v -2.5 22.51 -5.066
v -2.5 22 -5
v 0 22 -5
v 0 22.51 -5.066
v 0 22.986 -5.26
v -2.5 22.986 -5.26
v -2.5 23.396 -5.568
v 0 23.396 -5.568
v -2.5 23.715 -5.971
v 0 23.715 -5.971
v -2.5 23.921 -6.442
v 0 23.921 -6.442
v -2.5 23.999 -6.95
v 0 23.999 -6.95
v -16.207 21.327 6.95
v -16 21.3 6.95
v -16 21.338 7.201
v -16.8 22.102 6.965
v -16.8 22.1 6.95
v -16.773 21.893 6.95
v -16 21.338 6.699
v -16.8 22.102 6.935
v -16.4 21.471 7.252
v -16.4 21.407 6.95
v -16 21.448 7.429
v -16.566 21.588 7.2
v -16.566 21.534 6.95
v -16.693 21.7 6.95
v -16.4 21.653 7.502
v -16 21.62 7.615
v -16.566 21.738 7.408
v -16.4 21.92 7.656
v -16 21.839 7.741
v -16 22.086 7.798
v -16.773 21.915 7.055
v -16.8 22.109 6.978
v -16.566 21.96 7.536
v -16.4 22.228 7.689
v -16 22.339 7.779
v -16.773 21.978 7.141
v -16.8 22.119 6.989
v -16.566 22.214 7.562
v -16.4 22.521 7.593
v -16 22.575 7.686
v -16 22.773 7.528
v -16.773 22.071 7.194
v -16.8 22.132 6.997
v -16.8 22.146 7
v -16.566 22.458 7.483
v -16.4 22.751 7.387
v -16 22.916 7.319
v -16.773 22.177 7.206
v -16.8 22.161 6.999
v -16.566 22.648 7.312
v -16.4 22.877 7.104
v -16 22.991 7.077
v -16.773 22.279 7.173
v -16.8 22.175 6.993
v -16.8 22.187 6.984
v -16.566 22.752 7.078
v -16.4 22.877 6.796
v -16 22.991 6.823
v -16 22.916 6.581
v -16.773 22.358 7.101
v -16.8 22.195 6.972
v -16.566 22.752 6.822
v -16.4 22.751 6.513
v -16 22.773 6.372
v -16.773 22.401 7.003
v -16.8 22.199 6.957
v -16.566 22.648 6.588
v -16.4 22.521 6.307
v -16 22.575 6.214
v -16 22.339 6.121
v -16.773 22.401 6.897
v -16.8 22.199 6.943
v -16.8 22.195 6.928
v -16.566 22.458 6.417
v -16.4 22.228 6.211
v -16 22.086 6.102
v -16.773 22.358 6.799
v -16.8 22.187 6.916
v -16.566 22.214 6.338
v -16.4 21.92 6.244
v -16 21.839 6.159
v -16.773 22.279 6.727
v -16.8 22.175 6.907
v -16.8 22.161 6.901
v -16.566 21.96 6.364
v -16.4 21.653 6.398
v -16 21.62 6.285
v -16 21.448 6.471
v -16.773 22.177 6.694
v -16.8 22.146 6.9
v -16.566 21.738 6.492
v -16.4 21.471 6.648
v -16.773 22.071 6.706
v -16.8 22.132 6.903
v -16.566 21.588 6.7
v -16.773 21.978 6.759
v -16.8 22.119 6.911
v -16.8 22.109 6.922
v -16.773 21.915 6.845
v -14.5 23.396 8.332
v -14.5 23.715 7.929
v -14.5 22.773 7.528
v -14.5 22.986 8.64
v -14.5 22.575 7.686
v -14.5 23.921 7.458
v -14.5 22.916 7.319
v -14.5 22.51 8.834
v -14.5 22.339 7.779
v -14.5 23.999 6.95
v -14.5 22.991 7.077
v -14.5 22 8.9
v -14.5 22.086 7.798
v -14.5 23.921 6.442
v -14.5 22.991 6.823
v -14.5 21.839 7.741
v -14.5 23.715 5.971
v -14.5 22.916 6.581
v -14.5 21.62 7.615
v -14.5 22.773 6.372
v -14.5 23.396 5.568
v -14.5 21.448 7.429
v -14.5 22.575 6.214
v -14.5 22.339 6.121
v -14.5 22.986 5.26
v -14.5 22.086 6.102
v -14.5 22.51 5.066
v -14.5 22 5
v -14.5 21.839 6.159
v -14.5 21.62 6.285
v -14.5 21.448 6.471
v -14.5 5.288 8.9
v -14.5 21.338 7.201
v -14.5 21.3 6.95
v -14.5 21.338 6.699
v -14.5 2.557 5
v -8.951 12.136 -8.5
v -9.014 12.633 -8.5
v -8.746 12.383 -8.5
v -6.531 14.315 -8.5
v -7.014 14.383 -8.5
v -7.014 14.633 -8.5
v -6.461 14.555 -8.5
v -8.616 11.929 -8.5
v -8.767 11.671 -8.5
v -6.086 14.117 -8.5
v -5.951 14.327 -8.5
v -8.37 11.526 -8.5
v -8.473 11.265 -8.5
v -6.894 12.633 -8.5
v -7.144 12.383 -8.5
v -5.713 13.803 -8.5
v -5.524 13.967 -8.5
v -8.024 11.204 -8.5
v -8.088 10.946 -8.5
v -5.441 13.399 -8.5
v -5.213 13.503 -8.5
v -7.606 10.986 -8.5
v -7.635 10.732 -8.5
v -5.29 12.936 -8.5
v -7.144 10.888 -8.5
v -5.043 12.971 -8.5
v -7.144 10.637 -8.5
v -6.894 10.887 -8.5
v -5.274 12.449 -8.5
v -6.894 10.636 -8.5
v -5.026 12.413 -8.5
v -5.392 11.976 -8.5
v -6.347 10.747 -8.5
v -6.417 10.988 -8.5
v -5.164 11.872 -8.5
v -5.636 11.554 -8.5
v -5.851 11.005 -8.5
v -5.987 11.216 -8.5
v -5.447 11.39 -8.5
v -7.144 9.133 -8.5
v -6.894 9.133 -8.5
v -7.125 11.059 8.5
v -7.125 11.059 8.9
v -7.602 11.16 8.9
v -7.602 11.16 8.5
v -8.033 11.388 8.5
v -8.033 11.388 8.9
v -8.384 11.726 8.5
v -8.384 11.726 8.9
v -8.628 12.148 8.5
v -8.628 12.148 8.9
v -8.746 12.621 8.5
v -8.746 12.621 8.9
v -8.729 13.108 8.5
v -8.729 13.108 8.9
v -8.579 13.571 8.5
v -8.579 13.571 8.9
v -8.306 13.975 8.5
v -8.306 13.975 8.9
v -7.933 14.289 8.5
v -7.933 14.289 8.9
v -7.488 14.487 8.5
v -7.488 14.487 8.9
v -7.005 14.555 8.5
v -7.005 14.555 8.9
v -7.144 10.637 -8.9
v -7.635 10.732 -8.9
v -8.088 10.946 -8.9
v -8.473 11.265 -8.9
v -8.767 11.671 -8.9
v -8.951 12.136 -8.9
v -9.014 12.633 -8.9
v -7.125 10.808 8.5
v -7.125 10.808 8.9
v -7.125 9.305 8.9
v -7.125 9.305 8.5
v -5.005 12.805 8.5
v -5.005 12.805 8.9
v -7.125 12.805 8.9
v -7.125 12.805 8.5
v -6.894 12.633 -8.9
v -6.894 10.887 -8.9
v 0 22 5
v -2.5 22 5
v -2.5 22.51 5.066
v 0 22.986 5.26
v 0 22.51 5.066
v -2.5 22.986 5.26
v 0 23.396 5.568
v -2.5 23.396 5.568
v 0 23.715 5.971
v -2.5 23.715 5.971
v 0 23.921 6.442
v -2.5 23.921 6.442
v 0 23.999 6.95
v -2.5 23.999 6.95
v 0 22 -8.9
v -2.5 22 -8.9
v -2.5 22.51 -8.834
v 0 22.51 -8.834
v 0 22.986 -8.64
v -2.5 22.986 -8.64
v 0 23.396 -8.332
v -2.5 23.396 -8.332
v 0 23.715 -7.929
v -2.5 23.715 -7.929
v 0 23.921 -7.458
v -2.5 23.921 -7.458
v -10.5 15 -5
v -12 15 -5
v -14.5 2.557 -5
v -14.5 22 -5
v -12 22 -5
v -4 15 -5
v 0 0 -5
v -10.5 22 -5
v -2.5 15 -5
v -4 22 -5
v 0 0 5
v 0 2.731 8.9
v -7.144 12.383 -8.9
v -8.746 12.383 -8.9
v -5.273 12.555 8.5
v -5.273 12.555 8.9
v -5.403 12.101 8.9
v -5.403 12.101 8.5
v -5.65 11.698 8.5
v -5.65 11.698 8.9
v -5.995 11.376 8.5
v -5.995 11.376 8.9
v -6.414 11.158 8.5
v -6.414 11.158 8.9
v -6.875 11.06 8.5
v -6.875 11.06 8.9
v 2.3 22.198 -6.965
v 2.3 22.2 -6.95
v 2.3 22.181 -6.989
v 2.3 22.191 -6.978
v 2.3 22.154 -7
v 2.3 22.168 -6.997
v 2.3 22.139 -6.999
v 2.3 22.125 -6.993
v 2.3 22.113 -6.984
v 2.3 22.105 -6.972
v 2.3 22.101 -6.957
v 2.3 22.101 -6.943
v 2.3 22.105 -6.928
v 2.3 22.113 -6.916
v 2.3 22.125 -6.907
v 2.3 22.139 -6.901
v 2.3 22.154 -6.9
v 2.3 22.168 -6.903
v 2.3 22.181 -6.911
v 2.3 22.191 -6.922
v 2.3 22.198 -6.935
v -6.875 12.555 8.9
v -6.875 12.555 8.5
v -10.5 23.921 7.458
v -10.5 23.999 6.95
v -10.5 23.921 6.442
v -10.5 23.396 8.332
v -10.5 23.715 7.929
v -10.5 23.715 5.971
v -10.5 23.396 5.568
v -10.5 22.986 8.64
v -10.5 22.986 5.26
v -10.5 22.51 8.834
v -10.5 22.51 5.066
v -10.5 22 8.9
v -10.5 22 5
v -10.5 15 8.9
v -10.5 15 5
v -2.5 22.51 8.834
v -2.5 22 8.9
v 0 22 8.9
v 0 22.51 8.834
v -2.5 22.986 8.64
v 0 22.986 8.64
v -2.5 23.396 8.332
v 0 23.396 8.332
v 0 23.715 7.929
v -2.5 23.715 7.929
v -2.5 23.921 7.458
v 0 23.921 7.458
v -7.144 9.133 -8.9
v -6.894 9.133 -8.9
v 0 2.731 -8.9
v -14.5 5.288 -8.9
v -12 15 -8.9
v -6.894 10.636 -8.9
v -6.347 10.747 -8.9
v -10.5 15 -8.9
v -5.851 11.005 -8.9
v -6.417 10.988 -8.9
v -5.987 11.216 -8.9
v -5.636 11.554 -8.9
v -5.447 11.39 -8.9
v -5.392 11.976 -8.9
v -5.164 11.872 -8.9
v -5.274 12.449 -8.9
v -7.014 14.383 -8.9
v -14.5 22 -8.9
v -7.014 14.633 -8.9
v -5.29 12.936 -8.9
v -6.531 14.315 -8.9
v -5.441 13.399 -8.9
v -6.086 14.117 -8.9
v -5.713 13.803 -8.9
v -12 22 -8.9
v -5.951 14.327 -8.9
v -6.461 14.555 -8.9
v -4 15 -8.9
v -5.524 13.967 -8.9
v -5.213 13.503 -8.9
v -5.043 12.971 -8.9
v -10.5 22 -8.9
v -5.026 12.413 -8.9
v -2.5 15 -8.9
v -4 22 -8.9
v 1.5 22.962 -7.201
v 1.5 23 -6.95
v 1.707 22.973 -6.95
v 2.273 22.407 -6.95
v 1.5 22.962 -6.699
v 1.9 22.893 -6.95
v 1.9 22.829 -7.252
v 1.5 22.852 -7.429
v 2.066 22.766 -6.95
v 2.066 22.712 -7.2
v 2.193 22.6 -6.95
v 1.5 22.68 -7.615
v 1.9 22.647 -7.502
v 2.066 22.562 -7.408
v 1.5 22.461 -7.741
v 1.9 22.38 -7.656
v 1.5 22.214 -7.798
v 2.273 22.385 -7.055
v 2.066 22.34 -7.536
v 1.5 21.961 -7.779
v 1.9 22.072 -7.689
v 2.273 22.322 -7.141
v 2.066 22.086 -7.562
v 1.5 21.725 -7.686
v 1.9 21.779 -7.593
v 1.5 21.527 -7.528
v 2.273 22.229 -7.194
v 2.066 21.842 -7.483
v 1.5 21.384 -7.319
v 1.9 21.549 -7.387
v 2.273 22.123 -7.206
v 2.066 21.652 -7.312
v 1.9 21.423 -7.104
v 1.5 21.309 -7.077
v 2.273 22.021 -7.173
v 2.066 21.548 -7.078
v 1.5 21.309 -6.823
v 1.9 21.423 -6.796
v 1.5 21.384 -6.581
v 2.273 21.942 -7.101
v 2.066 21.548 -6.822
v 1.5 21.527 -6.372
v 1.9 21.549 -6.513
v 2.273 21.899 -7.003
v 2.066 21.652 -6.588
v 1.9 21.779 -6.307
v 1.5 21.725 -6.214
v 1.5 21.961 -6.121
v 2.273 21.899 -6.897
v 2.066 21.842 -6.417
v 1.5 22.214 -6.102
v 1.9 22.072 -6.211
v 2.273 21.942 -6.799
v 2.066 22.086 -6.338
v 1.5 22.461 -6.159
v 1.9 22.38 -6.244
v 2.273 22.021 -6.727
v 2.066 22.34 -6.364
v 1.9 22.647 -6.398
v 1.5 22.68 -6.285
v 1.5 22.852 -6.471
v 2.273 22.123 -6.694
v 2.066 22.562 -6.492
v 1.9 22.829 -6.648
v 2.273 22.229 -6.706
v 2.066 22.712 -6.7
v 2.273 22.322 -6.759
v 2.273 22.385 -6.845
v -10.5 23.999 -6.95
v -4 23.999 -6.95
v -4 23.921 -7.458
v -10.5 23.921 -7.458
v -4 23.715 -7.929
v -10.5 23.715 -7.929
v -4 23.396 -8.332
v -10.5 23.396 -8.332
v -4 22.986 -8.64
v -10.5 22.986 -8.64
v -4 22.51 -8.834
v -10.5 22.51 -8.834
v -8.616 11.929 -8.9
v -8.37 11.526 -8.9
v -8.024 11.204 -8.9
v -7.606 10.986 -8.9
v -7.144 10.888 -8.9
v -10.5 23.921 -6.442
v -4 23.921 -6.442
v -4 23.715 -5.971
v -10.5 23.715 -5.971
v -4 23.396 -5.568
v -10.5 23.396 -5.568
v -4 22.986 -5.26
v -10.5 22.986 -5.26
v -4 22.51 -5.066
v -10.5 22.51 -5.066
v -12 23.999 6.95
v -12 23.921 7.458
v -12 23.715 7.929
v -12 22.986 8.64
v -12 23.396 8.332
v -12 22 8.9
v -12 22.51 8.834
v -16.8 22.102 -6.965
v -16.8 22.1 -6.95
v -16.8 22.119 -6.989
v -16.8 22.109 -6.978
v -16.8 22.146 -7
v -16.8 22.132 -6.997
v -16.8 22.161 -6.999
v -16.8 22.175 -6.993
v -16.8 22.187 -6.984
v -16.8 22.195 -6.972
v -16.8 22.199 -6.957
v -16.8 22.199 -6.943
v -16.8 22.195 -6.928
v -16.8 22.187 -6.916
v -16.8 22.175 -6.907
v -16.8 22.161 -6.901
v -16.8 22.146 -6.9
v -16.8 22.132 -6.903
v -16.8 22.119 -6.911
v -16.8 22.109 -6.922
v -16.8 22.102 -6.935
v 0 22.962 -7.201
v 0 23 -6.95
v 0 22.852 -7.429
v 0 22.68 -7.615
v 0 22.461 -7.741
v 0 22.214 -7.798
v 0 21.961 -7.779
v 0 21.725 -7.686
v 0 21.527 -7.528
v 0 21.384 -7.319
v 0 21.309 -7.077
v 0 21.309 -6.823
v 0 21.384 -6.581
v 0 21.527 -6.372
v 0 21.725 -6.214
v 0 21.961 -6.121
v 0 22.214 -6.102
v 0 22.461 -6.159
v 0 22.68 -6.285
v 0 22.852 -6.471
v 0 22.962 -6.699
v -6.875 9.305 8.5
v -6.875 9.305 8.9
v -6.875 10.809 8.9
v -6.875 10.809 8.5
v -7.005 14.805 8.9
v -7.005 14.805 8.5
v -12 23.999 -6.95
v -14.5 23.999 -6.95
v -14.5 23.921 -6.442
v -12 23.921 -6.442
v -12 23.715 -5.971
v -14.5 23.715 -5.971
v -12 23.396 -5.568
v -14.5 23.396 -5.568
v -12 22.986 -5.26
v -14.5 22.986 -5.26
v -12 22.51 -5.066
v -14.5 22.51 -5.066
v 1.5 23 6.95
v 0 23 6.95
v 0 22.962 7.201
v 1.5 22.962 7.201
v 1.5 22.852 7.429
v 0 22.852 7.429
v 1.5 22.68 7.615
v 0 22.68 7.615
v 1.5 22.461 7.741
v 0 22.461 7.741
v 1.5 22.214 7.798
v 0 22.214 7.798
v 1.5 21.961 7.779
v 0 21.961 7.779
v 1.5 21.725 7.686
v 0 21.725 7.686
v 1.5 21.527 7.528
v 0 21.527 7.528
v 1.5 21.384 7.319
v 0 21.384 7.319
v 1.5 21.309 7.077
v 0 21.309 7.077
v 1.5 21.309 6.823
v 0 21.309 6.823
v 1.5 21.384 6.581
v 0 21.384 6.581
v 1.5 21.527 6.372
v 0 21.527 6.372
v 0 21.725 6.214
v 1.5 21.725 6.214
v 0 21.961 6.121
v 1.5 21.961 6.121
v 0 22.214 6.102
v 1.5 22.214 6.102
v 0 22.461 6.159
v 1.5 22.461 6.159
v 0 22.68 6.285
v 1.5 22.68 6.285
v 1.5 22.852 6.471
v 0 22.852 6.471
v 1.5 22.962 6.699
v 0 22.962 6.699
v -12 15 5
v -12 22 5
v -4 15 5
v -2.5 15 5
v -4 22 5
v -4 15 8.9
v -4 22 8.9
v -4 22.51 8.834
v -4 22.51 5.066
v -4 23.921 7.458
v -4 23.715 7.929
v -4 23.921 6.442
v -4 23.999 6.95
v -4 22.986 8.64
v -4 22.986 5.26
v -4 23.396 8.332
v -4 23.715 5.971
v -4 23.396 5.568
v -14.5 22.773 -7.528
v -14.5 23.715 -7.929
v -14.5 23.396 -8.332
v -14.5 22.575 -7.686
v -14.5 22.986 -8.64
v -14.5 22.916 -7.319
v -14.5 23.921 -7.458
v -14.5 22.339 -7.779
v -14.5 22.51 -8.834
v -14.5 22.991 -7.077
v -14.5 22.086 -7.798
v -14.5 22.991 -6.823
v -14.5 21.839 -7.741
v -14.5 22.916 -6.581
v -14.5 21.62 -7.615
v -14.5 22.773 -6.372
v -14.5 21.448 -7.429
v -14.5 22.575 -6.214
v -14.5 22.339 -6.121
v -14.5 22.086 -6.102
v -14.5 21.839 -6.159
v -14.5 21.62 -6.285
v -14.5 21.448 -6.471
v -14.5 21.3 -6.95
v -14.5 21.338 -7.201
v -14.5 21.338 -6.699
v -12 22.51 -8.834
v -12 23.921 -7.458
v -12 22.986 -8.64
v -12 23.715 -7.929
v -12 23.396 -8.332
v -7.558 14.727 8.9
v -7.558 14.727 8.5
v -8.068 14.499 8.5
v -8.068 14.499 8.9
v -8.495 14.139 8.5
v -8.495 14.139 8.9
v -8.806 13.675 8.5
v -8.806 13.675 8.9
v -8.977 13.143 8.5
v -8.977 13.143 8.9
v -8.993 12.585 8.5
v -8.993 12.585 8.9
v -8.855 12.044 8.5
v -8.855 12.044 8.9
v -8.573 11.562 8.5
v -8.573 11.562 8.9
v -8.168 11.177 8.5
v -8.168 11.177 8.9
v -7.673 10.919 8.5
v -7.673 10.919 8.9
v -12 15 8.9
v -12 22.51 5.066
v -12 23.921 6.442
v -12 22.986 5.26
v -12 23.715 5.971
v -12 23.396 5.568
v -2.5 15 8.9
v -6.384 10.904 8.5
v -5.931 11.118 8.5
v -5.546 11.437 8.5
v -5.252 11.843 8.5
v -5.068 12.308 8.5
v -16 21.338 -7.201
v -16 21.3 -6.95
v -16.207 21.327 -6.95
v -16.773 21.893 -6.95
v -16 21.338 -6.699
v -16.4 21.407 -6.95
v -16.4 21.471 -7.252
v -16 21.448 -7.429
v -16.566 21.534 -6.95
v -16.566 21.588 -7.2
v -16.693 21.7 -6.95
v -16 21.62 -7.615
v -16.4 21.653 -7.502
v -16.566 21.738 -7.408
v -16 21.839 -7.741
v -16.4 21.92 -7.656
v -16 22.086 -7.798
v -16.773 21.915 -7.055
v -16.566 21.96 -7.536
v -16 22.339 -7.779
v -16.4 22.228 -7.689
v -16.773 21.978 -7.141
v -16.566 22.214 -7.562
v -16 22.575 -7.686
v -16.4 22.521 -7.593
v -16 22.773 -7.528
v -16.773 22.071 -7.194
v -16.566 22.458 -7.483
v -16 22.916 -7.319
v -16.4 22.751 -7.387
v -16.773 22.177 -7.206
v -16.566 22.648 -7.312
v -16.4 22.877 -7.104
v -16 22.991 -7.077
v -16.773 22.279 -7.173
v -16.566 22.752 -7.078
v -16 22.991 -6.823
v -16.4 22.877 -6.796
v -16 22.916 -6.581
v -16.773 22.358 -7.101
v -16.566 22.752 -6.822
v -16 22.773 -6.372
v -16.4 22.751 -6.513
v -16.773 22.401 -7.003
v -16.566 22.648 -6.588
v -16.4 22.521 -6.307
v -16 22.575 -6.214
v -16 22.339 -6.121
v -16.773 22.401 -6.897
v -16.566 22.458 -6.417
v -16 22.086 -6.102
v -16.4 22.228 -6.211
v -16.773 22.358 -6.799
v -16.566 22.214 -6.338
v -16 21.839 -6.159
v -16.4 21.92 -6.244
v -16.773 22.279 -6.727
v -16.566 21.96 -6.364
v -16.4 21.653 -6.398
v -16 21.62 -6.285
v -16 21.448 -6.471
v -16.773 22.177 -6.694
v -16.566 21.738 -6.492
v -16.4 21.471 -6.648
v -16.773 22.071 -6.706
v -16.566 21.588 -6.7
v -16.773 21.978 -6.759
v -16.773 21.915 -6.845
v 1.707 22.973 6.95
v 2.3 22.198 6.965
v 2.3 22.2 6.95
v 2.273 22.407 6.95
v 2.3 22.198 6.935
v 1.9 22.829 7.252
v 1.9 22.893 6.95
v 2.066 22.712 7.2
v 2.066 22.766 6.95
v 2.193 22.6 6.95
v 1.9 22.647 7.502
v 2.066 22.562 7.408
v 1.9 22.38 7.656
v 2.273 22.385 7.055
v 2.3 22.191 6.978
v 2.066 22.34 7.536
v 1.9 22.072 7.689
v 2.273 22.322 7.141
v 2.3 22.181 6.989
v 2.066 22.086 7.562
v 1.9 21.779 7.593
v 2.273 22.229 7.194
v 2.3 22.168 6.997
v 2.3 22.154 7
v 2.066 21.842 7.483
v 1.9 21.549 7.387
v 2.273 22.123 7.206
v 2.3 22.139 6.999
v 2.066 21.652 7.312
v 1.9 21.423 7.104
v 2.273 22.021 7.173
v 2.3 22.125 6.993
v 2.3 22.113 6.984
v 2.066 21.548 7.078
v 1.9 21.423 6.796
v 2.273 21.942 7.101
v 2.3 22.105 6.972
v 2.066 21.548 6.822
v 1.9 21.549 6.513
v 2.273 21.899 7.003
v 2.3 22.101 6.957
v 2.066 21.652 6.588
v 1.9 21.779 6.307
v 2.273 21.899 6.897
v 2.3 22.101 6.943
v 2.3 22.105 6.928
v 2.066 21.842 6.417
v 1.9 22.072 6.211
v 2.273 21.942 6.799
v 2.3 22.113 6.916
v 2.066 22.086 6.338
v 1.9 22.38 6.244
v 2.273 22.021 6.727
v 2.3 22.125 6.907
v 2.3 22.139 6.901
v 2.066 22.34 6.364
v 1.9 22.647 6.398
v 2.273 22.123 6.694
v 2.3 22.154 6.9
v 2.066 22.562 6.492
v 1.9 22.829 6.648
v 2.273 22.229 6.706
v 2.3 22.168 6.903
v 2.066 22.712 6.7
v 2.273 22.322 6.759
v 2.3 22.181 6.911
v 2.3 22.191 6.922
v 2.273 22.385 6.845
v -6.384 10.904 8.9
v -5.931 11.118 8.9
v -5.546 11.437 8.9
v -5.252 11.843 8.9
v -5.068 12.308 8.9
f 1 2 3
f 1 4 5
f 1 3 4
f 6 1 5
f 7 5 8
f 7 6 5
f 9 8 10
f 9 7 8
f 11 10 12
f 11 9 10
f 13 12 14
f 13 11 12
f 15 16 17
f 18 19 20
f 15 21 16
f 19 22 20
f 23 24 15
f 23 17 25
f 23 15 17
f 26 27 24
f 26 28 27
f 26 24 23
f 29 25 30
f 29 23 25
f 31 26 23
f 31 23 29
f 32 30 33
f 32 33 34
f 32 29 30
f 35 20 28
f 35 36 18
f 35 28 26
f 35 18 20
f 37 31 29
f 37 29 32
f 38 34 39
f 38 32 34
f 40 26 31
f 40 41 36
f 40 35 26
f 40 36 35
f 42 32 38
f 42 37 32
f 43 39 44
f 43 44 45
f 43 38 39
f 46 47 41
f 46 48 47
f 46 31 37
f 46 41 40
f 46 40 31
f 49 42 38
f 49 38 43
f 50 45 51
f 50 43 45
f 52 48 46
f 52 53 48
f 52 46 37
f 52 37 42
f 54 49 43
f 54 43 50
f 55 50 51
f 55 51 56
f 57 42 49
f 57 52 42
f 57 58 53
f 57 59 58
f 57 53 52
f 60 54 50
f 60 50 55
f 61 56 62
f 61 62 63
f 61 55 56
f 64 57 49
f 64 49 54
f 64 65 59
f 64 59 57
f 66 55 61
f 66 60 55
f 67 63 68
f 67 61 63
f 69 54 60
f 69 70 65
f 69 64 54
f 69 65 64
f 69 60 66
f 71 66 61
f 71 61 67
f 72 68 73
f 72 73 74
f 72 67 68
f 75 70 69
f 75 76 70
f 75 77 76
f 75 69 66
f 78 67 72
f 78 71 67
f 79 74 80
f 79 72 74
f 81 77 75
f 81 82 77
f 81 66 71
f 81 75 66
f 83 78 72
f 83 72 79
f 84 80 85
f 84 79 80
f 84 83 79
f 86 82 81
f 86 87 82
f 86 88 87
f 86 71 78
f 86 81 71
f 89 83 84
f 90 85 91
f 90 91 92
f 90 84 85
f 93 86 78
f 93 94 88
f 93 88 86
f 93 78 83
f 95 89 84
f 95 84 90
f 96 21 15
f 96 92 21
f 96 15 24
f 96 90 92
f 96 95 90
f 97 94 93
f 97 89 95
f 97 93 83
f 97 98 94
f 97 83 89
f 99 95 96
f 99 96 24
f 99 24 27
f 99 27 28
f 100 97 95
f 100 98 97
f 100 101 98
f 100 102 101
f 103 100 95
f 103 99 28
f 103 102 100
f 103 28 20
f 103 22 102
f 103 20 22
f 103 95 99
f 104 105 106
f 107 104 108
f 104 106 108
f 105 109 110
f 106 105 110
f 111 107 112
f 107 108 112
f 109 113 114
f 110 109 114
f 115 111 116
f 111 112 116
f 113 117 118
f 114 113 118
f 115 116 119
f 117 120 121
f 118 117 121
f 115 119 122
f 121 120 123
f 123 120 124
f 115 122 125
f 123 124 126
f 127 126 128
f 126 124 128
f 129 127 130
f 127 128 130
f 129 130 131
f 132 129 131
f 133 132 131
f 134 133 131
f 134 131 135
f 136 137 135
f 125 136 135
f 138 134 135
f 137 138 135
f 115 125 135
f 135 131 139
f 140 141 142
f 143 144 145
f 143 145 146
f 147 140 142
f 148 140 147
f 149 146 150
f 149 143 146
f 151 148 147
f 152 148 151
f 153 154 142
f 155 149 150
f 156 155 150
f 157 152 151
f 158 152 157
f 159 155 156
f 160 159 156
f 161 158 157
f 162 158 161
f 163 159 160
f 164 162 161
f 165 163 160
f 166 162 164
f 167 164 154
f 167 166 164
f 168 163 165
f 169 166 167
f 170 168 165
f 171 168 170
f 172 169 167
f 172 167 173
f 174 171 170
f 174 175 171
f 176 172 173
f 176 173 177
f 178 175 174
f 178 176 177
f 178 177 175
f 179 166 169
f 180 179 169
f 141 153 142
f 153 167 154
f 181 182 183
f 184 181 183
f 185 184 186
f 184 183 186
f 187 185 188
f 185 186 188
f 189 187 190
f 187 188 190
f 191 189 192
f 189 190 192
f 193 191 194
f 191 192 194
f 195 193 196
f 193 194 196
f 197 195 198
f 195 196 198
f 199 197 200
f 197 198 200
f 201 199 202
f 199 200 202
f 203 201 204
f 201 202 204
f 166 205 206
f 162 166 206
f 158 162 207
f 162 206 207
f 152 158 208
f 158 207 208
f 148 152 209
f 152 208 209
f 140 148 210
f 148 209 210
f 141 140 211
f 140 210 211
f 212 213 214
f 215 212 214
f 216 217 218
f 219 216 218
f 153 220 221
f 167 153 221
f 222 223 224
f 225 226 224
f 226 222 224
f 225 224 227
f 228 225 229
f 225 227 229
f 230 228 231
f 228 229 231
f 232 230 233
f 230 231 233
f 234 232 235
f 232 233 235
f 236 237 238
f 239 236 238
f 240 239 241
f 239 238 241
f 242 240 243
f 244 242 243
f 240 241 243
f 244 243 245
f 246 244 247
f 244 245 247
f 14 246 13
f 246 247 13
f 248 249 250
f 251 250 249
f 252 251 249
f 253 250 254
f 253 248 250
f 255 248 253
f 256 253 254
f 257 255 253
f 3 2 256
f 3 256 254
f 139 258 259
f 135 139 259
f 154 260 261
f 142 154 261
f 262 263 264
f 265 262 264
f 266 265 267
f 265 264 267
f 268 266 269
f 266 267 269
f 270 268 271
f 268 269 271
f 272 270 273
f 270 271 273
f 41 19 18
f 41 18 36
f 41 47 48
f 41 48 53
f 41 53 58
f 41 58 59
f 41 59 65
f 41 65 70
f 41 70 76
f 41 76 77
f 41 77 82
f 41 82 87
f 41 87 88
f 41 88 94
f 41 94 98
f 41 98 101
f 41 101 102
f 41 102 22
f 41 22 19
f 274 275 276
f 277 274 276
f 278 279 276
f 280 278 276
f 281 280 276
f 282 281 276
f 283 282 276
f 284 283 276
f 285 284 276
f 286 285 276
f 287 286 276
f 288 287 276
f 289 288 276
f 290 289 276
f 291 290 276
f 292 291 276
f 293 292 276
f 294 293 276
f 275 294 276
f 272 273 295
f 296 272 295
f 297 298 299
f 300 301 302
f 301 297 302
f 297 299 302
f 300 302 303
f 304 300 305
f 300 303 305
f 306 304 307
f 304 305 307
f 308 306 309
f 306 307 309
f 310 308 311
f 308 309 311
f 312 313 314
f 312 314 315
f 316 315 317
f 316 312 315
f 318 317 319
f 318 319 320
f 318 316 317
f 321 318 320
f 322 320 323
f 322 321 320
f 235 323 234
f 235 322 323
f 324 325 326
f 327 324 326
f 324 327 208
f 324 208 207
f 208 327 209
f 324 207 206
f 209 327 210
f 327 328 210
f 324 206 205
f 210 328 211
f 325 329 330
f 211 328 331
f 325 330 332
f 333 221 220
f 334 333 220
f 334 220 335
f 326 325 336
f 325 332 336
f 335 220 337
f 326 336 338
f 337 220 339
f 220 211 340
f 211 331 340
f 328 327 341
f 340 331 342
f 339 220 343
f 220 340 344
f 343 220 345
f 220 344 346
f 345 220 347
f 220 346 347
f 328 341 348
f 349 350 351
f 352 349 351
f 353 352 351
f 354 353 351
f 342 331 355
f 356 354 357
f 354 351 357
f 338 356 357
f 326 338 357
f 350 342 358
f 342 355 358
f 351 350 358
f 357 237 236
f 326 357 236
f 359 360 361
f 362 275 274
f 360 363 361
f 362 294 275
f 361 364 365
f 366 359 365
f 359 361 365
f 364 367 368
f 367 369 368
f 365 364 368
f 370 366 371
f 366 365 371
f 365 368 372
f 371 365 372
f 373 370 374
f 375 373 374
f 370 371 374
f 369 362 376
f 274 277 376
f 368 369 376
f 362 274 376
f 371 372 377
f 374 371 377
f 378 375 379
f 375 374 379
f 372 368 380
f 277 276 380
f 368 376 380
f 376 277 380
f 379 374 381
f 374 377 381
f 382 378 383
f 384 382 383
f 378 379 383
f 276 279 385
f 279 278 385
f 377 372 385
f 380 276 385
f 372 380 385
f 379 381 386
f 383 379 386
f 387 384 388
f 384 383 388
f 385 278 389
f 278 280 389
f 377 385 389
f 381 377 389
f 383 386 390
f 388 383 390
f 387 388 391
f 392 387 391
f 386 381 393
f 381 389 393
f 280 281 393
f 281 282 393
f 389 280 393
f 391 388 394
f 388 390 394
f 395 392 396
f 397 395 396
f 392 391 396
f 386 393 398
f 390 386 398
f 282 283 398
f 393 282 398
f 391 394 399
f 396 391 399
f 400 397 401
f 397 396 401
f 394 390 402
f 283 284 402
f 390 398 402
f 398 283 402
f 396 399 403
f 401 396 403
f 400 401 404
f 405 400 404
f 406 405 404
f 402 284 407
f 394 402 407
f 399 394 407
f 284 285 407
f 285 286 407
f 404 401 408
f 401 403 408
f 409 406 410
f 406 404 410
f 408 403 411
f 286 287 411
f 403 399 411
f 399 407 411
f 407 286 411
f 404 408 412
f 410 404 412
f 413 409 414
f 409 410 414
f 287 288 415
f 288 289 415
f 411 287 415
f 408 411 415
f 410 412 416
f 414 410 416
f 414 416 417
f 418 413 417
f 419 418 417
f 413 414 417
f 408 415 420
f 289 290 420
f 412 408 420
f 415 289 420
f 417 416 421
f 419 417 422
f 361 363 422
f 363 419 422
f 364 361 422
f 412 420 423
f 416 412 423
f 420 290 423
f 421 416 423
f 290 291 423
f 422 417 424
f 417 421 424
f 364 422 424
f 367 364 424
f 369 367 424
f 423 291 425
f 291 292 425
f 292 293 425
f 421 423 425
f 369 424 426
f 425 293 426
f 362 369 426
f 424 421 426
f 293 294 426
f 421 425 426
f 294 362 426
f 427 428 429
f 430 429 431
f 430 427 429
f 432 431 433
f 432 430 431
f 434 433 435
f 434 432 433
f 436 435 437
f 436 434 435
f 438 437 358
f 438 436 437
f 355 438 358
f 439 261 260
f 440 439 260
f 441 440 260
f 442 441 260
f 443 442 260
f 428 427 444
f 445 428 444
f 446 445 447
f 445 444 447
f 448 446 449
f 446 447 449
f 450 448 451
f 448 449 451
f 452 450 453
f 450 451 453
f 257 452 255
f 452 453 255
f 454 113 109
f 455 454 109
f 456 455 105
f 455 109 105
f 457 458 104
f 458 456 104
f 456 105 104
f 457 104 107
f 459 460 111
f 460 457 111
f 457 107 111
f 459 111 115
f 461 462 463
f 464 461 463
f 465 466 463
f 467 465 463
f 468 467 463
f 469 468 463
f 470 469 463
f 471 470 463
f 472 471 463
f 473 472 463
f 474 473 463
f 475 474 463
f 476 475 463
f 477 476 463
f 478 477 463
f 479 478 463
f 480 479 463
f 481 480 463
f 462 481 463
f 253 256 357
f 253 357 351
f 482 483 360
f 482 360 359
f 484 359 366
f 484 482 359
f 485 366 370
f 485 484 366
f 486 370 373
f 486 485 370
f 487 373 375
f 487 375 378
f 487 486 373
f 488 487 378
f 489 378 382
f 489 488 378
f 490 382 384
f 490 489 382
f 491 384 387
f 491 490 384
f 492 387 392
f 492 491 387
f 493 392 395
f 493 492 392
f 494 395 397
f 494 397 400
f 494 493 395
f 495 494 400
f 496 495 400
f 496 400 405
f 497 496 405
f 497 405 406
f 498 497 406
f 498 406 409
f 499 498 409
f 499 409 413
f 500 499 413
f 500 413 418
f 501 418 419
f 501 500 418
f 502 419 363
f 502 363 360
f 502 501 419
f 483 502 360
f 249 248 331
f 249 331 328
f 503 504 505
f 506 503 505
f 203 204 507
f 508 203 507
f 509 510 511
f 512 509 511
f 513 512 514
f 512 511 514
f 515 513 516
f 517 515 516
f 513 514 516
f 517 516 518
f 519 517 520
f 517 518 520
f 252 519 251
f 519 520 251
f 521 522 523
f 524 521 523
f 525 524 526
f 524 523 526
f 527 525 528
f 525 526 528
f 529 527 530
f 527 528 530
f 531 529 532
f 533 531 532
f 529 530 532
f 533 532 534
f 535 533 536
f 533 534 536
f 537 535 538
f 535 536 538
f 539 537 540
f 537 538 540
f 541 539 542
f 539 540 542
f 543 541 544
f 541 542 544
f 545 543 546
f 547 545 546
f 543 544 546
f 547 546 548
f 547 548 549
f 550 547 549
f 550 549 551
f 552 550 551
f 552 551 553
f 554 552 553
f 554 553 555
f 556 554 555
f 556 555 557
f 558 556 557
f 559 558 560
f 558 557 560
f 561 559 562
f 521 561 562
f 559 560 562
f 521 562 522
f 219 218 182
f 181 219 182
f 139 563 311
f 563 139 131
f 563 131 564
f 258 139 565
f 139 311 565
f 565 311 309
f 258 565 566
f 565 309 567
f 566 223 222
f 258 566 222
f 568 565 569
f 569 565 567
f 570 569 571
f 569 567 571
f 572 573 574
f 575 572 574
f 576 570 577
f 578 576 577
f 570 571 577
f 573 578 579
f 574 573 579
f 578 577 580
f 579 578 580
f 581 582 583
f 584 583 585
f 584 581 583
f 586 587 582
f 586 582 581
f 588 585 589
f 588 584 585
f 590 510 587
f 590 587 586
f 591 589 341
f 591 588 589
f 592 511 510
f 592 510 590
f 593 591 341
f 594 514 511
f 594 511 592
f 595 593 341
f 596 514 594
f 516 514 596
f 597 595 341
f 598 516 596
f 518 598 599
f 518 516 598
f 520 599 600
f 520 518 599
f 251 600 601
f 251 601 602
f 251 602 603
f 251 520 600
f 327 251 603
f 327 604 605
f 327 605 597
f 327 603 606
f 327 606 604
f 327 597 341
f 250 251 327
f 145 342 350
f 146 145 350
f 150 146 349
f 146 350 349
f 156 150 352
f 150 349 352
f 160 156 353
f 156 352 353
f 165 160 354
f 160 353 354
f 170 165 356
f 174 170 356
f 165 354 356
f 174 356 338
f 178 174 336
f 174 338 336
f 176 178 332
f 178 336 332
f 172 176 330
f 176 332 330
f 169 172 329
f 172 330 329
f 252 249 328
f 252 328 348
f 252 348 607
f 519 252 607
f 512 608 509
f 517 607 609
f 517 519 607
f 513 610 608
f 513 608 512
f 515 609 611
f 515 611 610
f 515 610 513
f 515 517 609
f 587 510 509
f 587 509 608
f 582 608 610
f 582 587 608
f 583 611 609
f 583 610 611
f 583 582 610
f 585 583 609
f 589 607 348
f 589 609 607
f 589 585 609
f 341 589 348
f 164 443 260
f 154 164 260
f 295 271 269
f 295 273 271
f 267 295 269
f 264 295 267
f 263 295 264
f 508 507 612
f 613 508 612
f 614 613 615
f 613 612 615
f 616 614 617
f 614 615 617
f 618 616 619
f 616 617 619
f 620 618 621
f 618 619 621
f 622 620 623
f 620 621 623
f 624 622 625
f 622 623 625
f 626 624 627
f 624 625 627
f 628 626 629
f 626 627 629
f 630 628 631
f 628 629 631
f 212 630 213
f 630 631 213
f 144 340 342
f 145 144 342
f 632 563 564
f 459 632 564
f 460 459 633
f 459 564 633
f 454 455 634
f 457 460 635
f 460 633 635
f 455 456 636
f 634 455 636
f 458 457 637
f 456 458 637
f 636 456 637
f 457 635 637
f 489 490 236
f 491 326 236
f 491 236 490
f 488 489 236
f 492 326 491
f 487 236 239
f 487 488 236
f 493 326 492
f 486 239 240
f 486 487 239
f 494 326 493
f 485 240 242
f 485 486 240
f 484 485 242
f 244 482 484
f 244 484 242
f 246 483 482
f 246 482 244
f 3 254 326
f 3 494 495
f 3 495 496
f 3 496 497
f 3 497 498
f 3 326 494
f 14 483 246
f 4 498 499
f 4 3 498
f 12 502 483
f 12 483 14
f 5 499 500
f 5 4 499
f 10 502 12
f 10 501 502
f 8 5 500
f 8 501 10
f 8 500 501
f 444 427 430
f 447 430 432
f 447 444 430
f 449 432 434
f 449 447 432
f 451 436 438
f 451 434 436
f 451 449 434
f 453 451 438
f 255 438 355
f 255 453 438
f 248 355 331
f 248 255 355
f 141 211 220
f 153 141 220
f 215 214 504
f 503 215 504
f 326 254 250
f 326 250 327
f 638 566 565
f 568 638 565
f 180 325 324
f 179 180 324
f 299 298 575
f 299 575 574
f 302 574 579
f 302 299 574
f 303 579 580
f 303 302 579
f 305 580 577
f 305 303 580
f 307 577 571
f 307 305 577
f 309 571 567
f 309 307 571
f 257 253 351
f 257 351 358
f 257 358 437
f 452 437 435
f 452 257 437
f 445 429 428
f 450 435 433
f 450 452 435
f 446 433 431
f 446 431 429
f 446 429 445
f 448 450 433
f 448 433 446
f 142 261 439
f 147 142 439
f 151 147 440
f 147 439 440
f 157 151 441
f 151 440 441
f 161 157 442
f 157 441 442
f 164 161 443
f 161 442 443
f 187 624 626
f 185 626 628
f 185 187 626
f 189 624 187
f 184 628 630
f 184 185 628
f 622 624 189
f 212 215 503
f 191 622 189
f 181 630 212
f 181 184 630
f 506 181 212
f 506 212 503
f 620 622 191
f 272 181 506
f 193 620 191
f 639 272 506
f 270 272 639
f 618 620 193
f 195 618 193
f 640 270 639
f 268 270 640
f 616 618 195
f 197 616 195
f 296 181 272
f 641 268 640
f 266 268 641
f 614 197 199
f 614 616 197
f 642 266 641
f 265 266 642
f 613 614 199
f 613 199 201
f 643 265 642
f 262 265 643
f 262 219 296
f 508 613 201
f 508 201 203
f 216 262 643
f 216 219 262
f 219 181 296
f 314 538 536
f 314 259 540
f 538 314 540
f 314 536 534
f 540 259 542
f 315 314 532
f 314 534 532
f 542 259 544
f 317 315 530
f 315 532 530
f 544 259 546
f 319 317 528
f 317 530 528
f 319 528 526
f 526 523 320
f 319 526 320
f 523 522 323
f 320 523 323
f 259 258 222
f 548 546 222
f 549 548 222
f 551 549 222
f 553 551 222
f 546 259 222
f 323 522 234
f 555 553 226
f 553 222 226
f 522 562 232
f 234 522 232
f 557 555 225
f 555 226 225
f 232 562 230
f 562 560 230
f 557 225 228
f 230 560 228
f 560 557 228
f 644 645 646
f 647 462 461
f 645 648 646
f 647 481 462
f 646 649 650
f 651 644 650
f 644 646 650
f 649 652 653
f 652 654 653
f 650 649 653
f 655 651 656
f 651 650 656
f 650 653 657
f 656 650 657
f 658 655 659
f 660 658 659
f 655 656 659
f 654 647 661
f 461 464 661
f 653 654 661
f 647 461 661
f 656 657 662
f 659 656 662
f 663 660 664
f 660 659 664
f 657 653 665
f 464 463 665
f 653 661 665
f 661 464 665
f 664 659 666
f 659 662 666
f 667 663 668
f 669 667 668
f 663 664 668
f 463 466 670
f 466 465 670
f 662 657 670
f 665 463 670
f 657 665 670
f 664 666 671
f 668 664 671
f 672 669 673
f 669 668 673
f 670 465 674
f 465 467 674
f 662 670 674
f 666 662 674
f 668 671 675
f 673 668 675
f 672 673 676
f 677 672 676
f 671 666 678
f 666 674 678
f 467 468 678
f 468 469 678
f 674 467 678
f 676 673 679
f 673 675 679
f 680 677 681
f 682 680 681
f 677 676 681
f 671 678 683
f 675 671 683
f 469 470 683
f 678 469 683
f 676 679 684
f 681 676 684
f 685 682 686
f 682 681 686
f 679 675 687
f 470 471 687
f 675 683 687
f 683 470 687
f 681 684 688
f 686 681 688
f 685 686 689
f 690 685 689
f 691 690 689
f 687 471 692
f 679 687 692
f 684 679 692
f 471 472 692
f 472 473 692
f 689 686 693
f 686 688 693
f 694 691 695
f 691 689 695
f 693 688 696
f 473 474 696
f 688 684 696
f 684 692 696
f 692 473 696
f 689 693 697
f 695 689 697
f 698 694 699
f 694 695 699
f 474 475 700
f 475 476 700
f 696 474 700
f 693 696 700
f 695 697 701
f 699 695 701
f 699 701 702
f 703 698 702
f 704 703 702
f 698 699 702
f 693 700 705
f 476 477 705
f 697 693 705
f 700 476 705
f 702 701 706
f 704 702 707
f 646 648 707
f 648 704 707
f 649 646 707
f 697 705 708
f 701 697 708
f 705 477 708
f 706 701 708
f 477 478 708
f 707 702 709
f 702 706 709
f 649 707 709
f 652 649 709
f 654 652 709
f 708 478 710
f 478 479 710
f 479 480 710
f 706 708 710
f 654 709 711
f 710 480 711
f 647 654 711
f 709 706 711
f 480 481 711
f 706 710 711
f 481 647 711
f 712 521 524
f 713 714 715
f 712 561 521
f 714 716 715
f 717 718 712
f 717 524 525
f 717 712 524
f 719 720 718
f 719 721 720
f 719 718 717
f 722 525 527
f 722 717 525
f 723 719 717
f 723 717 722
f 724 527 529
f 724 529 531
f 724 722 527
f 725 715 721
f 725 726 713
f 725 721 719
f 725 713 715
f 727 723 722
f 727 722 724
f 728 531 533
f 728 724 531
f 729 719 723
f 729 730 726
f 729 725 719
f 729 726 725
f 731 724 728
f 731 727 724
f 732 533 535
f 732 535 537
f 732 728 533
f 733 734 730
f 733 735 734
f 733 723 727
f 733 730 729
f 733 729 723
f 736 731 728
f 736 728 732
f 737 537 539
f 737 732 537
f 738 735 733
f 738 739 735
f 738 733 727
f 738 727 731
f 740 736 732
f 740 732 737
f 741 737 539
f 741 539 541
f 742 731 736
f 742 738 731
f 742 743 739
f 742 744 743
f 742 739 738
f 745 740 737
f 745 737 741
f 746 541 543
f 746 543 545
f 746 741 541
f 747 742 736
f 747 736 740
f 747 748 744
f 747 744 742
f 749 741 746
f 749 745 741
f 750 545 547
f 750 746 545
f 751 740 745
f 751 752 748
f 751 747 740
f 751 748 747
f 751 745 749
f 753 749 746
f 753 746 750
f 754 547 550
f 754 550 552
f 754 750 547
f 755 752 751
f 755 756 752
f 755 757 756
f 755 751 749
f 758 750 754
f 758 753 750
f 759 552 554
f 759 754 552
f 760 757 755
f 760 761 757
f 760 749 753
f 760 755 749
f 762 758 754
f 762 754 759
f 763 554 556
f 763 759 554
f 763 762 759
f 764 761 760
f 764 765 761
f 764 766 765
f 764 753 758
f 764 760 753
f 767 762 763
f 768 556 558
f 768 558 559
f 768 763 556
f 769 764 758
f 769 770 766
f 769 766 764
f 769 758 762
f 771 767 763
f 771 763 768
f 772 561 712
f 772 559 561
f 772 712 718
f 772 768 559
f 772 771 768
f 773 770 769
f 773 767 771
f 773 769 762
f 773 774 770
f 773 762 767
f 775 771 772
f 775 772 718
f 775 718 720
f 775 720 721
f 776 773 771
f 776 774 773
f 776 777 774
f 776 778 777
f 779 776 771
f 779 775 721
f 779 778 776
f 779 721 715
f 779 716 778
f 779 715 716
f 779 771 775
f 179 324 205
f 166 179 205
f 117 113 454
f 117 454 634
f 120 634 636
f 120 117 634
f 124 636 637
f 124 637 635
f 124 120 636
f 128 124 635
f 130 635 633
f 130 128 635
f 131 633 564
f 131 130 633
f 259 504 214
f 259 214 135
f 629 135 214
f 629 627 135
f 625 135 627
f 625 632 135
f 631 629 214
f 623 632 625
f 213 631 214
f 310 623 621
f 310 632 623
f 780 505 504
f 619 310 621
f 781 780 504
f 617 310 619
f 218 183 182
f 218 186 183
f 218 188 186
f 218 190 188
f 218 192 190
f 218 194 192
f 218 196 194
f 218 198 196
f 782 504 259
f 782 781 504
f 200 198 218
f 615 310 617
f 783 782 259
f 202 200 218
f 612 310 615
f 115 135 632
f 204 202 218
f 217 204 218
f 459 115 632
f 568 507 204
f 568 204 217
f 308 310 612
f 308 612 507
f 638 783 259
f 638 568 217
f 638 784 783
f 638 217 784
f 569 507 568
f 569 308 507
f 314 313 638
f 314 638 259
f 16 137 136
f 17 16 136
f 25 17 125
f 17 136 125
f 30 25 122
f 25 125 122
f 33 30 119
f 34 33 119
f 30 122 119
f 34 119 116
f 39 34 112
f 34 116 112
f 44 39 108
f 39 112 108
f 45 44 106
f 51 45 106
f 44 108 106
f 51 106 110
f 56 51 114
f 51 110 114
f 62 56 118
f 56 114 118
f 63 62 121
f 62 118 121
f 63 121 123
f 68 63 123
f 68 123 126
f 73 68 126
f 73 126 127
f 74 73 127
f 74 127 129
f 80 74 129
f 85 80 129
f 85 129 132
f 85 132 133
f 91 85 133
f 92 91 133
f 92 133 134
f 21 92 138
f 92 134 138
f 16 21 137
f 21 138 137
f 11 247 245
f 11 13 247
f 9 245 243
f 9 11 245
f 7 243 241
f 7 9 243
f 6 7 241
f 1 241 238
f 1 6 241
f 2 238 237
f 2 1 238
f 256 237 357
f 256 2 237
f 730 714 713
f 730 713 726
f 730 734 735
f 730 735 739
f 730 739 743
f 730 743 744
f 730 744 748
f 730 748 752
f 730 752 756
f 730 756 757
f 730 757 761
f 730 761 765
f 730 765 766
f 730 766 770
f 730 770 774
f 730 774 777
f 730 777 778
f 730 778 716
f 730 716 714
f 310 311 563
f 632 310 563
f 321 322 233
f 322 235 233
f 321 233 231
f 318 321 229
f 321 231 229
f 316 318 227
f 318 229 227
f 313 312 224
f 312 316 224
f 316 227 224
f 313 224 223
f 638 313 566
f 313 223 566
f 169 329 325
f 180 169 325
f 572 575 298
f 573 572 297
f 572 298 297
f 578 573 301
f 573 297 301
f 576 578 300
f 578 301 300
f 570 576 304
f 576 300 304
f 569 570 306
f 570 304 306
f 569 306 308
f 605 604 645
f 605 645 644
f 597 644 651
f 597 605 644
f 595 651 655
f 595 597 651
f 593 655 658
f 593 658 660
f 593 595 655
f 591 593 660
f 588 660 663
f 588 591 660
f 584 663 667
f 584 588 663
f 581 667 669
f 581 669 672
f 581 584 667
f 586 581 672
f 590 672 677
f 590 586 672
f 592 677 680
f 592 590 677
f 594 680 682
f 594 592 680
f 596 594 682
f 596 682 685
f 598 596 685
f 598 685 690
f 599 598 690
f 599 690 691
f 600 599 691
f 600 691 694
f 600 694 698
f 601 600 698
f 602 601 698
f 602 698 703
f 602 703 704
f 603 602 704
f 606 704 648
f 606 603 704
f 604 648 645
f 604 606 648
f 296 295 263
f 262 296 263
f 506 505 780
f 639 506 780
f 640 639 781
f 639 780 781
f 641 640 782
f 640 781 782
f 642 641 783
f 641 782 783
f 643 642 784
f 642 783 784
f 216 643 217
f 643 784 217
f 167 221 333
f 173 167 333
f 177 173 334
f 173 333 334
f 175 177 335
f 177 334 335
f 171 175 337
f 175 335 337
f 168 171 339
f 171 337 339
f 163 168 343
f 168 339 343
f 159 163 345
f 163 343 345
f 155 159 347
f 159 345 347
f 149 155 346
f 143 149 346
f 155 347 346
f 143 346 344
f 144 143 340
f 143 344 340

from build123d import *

# Parameters (mm, degrees)
F1_DEPTH    = 3.9
F2_R        = 0.85
F3_DEPTH    = 2.3
F4_R        = 0.85
F5_DEPTH    = 2.3
F6_R        = 0.8
F7_T1_DEPTH = 12.5
F7_T3_DEPTH = 12.5
F13_DEPTH   = 0.4
F15_DEPTH   = 0.4


# Not quite as in the source:
# - a fillet or chamfer that OpenCascade refuses, or shapes differently, is made with other operations: its cross-section is extruded or revolved along the edge and cut away or added
# - a feature names something its author has since deleted; it is built from what else it names


with BuildPart() as f1:
    # F0 (on Top) → F1 (new body)
    with BuildSketch(Plane.XY):
        Polygon((-14.5, 2.5567412203), (0, 0), (0, 24), (-2.5, 24), (-2.5, 15), (-4, 15), (-4, 24), (-10.5, 24), (-10.5, 15), (-12, 15), (-12, 24), (-14.5, 24), align=None)
    extrude(amount=F1_DEPTH)

    # F2 (on face) → F3 (join)
    with BuildSketch(Plane.YZ):
        with Locations((22.15, 1.95)):
            Circle(F2_R)
    extrude(amount=F3_DEPTH)

    # F4 (on face) → F5 (join)
    with BuildSketch(Plane(origin=(-14.5, 0, 0), x_dir=(0, -1, 0), z_dir=(-1, 0, 0))):
        with Locations((-22.15, 1.95)):
            Circle(F4_R)
    extrude(amount=F5_DEPTH)

    # F6
    f6_edges = [f1.edges().sort_by_distance(p)[0] for p in [
        (2.3, 21.3, 1.95),
        (-16.8, 23, 1.95),
    ]]
    fillet(f6_edges, radius=F6_R)

    # F7: fillet of radius 2 on 4 edges, made by hand

    # F7_s2 → F7_t1 (cut)
    with BuildSketch(Plane.YZ.offset(-19.5)):
        with BuildLine():
            ThreePointArc((24, 1.9), (23.4142135624, 3.3142135624), (22, 3.9))
            Line((22, 3.9), (24, 3.9))
            Line((24, 3.9), (24, 1.9))
        make_face()
        with BuildLine():
            ThreePointArc((24, 2), (23.4142135624, 0.5857864376), (22, 0))
            Line((22, 0), (24, 0))
            Line((24, 0), (24, 2))
        make_face()
    extrude(amount=F7_T1_DEPTH, mode=Mode.SUBTRACT)

    # F7_s4 → F7_t3 (cut)
    with BuildSketch(Plane.YZ.offset(-7.5)):
        with BuildLine():
            ThreePointArc((22, 3.9), (23.4142135624, 3.3142135624), (24, 1.9))
            Line((24, 1.9), (24, 3.9))
            Line((24, 3.9), (22, 3.9))
        make_face()
        with BuildLine():
            ThreePointArc((22, 0), (23.4142135624, 0.5857864376), (24, 2))
            Line((24, 2), (24, 0))
            Line((24, 0), (22, 0))
        make_face()
    extrude(amount=F7_T3_DEPTH, mode=Mode.SUBTRACT)

    # F9: sweep along a path in F9_path
    with BuildLine(Plane(origin=(0, 0, 3.9), x_dir=(0.984807753, -0.1736481777, 0), z_dir=(0.1736481777, 0.984807753, 0))) as f9_path:
        Line((0, 0), (-14.7236858723, 0))
    # F8 (on face) → F9 (sweep, cut)
    with BuildSketch(Plane.YZ):
        Polygon((0, 3.9), (0, 0), (2.730809399, 3.9), align=None)
    sweep(path=f9_path.line, mode=Mode.SUBTRACT)


with BuildPart() as f1_1:
    # F10: moved
    add(f1.part.moved(Location((0, 0, 5))))


with BuildPart() as f11_1:
    # F11: instance of F1
    add(f1_1.part.mirror(Plane.XY))

    # F14 (on face) → F15 (cut)
    with BuildSketch(Plane(origin=(0, 0, -8.9), x_dir=(1, 0, 0), z_dir=(0, 0, -1))):
        with BuildLine():
            Line((-7.0138571055, -14.382870473), (-7.0138571055, -14.632870473))
            ThreePointArc((-7.0138571055, -14.632870473), (-5.0147581199, -12.6928975156), (-6.8938571055, -10.6364737188))
            Line((-6.8938571055, -10.6364737188), (-6.8938571055, -10.8869896065))
            ThreePointArc((-6.8938571055, -10.8869896065), (-5.264887192, -12.692905811), (-7.0138571055, -14.382870473))
        make_face()
        with BuildLine():
            Line((-6.8938571055, -12.632870473), (-6.8938571055, -10.8869896065))
            ThreePointArc((-6.8938571055, -10.8869896065), (-7.0188699097, -10.8828776525), (-7.1438571055, -10.8877057243))
            Line((-7.1438571055, -10.8877057243), (-7.1438571055, -12.382870473))
            Line((-7.1438571055, -12.382870473), (-8.745907913, -12.382870473))
            ThreePointArc((-8.745907913, -12.382870473), (-8.7593640395, -12.5075487136), (-8.7638571055, -12.632870473))
            Line((-8.7638571055, -12.632870473), (-6.8938571055, -12.632870473))
        make_face()
        with BuildLine():
            Line((-7.1438571055, -10.8877057243), (-7.1438571055, -10.6370999451))
            ThreePointArc((-7.1438571055, -10.6370999451), (-8.4733090574, -11.2653910398), (-9.0138571055, -12.632870473))
            Line((-9.0138571055, -12.632870473), (-8.7638571055, -12.632870473))
            ThreePointArc((-8.7638571055, -12.632870473), (-8.7593640395, -12.5075487136), (-8.745907913, -12.382870473))
            ThreePointArc((-8.745907913, -12.382870473), (-8.2078787589, -11.3534908221), (-7.1438571055, -10.8877057243))
        make_face()
        with BuildLine():
            Line((-6.8938571055, -10.8869896065), (-6.8938571055, -10.6364737188))
            ThreePointArc((-6.8938571055, -10.6364737188), (-7.0188668999, -10.6328767475), (-7.1438571055, -10.6370999451))
            Line((-7.1438571055, -10.6370999451), (-7.1438571055, -10.8877057243))
            ThreePointArc((-7.1438571055, -10.8877057243), (-7.0188699097, -10.8828776525), (-6.8938571055, -10.8869896065))
        make_face()
        with BuildLine():
            ThreePointArc((-7.1438571055, -10.6370999451), (-7.0188668999, -10.6328767475), (-6.8938571055, -10.6364737188))
            Line((-6.8938571055, -10.6364737188), (-6.8938571055, -9.132870473))
            Line((-6.8938571055, -9.132870473), (-7.1438571055, -9.132870473))
            Line((-7.1438571055, -9.132870473), (-7.1438571055, -10.6370999451))
        make_face()
    extrude(amount=-F15_DEPTH, mode=Mode.SUBTRACT)


with BuildPart() as f1_2:
    add(f1_1.part)

    # F12 (on face) → F13 (cut)
    with BuildSketch(Plane.XY.offset(8.9)):
        with BuildLine():
            Line((-7.0054624054, 14.5548715198), (-7.0054624054, 14.8048715198))
            ThreePointArc((-7.0054624054, 14.8048715198), (-9.004561391, 12.8648985624), (-7.1254624054, 10.8084747656))
            Line((-7.1254624054, 10.8084747656), (-7.1254624054, 11.0589906533))
            ThreePointArc((-7.1254624054, 11.0589906533), (-8.7544323188, 12.8649068578), (-7.0054624054, 14.5548715198))
        make_face()
        with BuildLine():
            Line((-6.8754624054, 11.0597067711), (-6.8754624054, 10.8091009919))
            ThreePointArc((-6.8754624054, 10.8091009919), (-5.5460104535, 11.4373920867), (-5.0054624054, 12.8048715198))
            Line((-5.0054624054, 12.8048715198), (-5.2554624054, 12.8048715198))
            ThreePointArc((-5.2554624054, 12.8048715198), (-5.2599554714, 12.6795497604), (-5.2734115978, 12.5548715198))
            ThreePointArc((-5.2734115978, 12.5548715198), (-5.8114407519, 11.5254918689), (-6.8754624054, 11.0597067711))
        make_face()
        with BuildLine():
            Line((-7.1254624054, 12.8048715198), (-7.1254624054, 11.0589906533))
            ThreePointArc((-7.1254624054, 11.0589906533), (-7.0004496012, 11.0548786993), (-6.8754624054, 11.0597067711))
            Line((-6.8754624054, 11.0597067711), (-6.8754624054, 12.5548715198))
            Line((-6.8754624054, 12.5548715198), (-5.2734115978, 12.5548715198))
            ThreePointArc((-5.2734115978, 12.5548715198), (-5.2599554714, 12.6795497604), (-5.2554624054, 12.8048715198))
            Line((-5.2554624054, 12.8048715198), (-7.1254624054, 12.8048715198))
        make_face()
        with BuildLine():
            Line((-7.1254624054, 11.0589906533), (-7.1254624054, 10.8084747656))
            ThreePointArc((-7.1254624054, 10.8084747656), (-7.000452611, 10.8048777943), (-6.8754624054, 10.8091009919))
            Line((-6.8754624054, 10.8091009919), (-6.8754624054, 11.0597067711))
            ThreePointArc((-6.8754624054, 11.0597067711), (-7.0004496012, 11.0548786993), (-7.1254624054, 11.0589906533))
        make_face()
        with BuildLine():
            ThreePointArc((-6.8754624054, 10.8091009919), (-7.000452611, 10.8048777943), (-7.1254624054, 10.8084747656))
            Line((-7.1254624054, 10.8084747656), (-7.1254624054, 9.3048715198))
            Line((-7.1254624054, 9.3048715198), (-6.8754624054, 9.3048715198))
            Line((-6.8754624054, 9.3048715198), (-6.8754624054, 10.8091009919))
        make_face()
    extrude(amount=-F13_DEPTH, mode=Mode.SUBTRACT)


solid = Compound([f11_1.part, f1_2.part])
